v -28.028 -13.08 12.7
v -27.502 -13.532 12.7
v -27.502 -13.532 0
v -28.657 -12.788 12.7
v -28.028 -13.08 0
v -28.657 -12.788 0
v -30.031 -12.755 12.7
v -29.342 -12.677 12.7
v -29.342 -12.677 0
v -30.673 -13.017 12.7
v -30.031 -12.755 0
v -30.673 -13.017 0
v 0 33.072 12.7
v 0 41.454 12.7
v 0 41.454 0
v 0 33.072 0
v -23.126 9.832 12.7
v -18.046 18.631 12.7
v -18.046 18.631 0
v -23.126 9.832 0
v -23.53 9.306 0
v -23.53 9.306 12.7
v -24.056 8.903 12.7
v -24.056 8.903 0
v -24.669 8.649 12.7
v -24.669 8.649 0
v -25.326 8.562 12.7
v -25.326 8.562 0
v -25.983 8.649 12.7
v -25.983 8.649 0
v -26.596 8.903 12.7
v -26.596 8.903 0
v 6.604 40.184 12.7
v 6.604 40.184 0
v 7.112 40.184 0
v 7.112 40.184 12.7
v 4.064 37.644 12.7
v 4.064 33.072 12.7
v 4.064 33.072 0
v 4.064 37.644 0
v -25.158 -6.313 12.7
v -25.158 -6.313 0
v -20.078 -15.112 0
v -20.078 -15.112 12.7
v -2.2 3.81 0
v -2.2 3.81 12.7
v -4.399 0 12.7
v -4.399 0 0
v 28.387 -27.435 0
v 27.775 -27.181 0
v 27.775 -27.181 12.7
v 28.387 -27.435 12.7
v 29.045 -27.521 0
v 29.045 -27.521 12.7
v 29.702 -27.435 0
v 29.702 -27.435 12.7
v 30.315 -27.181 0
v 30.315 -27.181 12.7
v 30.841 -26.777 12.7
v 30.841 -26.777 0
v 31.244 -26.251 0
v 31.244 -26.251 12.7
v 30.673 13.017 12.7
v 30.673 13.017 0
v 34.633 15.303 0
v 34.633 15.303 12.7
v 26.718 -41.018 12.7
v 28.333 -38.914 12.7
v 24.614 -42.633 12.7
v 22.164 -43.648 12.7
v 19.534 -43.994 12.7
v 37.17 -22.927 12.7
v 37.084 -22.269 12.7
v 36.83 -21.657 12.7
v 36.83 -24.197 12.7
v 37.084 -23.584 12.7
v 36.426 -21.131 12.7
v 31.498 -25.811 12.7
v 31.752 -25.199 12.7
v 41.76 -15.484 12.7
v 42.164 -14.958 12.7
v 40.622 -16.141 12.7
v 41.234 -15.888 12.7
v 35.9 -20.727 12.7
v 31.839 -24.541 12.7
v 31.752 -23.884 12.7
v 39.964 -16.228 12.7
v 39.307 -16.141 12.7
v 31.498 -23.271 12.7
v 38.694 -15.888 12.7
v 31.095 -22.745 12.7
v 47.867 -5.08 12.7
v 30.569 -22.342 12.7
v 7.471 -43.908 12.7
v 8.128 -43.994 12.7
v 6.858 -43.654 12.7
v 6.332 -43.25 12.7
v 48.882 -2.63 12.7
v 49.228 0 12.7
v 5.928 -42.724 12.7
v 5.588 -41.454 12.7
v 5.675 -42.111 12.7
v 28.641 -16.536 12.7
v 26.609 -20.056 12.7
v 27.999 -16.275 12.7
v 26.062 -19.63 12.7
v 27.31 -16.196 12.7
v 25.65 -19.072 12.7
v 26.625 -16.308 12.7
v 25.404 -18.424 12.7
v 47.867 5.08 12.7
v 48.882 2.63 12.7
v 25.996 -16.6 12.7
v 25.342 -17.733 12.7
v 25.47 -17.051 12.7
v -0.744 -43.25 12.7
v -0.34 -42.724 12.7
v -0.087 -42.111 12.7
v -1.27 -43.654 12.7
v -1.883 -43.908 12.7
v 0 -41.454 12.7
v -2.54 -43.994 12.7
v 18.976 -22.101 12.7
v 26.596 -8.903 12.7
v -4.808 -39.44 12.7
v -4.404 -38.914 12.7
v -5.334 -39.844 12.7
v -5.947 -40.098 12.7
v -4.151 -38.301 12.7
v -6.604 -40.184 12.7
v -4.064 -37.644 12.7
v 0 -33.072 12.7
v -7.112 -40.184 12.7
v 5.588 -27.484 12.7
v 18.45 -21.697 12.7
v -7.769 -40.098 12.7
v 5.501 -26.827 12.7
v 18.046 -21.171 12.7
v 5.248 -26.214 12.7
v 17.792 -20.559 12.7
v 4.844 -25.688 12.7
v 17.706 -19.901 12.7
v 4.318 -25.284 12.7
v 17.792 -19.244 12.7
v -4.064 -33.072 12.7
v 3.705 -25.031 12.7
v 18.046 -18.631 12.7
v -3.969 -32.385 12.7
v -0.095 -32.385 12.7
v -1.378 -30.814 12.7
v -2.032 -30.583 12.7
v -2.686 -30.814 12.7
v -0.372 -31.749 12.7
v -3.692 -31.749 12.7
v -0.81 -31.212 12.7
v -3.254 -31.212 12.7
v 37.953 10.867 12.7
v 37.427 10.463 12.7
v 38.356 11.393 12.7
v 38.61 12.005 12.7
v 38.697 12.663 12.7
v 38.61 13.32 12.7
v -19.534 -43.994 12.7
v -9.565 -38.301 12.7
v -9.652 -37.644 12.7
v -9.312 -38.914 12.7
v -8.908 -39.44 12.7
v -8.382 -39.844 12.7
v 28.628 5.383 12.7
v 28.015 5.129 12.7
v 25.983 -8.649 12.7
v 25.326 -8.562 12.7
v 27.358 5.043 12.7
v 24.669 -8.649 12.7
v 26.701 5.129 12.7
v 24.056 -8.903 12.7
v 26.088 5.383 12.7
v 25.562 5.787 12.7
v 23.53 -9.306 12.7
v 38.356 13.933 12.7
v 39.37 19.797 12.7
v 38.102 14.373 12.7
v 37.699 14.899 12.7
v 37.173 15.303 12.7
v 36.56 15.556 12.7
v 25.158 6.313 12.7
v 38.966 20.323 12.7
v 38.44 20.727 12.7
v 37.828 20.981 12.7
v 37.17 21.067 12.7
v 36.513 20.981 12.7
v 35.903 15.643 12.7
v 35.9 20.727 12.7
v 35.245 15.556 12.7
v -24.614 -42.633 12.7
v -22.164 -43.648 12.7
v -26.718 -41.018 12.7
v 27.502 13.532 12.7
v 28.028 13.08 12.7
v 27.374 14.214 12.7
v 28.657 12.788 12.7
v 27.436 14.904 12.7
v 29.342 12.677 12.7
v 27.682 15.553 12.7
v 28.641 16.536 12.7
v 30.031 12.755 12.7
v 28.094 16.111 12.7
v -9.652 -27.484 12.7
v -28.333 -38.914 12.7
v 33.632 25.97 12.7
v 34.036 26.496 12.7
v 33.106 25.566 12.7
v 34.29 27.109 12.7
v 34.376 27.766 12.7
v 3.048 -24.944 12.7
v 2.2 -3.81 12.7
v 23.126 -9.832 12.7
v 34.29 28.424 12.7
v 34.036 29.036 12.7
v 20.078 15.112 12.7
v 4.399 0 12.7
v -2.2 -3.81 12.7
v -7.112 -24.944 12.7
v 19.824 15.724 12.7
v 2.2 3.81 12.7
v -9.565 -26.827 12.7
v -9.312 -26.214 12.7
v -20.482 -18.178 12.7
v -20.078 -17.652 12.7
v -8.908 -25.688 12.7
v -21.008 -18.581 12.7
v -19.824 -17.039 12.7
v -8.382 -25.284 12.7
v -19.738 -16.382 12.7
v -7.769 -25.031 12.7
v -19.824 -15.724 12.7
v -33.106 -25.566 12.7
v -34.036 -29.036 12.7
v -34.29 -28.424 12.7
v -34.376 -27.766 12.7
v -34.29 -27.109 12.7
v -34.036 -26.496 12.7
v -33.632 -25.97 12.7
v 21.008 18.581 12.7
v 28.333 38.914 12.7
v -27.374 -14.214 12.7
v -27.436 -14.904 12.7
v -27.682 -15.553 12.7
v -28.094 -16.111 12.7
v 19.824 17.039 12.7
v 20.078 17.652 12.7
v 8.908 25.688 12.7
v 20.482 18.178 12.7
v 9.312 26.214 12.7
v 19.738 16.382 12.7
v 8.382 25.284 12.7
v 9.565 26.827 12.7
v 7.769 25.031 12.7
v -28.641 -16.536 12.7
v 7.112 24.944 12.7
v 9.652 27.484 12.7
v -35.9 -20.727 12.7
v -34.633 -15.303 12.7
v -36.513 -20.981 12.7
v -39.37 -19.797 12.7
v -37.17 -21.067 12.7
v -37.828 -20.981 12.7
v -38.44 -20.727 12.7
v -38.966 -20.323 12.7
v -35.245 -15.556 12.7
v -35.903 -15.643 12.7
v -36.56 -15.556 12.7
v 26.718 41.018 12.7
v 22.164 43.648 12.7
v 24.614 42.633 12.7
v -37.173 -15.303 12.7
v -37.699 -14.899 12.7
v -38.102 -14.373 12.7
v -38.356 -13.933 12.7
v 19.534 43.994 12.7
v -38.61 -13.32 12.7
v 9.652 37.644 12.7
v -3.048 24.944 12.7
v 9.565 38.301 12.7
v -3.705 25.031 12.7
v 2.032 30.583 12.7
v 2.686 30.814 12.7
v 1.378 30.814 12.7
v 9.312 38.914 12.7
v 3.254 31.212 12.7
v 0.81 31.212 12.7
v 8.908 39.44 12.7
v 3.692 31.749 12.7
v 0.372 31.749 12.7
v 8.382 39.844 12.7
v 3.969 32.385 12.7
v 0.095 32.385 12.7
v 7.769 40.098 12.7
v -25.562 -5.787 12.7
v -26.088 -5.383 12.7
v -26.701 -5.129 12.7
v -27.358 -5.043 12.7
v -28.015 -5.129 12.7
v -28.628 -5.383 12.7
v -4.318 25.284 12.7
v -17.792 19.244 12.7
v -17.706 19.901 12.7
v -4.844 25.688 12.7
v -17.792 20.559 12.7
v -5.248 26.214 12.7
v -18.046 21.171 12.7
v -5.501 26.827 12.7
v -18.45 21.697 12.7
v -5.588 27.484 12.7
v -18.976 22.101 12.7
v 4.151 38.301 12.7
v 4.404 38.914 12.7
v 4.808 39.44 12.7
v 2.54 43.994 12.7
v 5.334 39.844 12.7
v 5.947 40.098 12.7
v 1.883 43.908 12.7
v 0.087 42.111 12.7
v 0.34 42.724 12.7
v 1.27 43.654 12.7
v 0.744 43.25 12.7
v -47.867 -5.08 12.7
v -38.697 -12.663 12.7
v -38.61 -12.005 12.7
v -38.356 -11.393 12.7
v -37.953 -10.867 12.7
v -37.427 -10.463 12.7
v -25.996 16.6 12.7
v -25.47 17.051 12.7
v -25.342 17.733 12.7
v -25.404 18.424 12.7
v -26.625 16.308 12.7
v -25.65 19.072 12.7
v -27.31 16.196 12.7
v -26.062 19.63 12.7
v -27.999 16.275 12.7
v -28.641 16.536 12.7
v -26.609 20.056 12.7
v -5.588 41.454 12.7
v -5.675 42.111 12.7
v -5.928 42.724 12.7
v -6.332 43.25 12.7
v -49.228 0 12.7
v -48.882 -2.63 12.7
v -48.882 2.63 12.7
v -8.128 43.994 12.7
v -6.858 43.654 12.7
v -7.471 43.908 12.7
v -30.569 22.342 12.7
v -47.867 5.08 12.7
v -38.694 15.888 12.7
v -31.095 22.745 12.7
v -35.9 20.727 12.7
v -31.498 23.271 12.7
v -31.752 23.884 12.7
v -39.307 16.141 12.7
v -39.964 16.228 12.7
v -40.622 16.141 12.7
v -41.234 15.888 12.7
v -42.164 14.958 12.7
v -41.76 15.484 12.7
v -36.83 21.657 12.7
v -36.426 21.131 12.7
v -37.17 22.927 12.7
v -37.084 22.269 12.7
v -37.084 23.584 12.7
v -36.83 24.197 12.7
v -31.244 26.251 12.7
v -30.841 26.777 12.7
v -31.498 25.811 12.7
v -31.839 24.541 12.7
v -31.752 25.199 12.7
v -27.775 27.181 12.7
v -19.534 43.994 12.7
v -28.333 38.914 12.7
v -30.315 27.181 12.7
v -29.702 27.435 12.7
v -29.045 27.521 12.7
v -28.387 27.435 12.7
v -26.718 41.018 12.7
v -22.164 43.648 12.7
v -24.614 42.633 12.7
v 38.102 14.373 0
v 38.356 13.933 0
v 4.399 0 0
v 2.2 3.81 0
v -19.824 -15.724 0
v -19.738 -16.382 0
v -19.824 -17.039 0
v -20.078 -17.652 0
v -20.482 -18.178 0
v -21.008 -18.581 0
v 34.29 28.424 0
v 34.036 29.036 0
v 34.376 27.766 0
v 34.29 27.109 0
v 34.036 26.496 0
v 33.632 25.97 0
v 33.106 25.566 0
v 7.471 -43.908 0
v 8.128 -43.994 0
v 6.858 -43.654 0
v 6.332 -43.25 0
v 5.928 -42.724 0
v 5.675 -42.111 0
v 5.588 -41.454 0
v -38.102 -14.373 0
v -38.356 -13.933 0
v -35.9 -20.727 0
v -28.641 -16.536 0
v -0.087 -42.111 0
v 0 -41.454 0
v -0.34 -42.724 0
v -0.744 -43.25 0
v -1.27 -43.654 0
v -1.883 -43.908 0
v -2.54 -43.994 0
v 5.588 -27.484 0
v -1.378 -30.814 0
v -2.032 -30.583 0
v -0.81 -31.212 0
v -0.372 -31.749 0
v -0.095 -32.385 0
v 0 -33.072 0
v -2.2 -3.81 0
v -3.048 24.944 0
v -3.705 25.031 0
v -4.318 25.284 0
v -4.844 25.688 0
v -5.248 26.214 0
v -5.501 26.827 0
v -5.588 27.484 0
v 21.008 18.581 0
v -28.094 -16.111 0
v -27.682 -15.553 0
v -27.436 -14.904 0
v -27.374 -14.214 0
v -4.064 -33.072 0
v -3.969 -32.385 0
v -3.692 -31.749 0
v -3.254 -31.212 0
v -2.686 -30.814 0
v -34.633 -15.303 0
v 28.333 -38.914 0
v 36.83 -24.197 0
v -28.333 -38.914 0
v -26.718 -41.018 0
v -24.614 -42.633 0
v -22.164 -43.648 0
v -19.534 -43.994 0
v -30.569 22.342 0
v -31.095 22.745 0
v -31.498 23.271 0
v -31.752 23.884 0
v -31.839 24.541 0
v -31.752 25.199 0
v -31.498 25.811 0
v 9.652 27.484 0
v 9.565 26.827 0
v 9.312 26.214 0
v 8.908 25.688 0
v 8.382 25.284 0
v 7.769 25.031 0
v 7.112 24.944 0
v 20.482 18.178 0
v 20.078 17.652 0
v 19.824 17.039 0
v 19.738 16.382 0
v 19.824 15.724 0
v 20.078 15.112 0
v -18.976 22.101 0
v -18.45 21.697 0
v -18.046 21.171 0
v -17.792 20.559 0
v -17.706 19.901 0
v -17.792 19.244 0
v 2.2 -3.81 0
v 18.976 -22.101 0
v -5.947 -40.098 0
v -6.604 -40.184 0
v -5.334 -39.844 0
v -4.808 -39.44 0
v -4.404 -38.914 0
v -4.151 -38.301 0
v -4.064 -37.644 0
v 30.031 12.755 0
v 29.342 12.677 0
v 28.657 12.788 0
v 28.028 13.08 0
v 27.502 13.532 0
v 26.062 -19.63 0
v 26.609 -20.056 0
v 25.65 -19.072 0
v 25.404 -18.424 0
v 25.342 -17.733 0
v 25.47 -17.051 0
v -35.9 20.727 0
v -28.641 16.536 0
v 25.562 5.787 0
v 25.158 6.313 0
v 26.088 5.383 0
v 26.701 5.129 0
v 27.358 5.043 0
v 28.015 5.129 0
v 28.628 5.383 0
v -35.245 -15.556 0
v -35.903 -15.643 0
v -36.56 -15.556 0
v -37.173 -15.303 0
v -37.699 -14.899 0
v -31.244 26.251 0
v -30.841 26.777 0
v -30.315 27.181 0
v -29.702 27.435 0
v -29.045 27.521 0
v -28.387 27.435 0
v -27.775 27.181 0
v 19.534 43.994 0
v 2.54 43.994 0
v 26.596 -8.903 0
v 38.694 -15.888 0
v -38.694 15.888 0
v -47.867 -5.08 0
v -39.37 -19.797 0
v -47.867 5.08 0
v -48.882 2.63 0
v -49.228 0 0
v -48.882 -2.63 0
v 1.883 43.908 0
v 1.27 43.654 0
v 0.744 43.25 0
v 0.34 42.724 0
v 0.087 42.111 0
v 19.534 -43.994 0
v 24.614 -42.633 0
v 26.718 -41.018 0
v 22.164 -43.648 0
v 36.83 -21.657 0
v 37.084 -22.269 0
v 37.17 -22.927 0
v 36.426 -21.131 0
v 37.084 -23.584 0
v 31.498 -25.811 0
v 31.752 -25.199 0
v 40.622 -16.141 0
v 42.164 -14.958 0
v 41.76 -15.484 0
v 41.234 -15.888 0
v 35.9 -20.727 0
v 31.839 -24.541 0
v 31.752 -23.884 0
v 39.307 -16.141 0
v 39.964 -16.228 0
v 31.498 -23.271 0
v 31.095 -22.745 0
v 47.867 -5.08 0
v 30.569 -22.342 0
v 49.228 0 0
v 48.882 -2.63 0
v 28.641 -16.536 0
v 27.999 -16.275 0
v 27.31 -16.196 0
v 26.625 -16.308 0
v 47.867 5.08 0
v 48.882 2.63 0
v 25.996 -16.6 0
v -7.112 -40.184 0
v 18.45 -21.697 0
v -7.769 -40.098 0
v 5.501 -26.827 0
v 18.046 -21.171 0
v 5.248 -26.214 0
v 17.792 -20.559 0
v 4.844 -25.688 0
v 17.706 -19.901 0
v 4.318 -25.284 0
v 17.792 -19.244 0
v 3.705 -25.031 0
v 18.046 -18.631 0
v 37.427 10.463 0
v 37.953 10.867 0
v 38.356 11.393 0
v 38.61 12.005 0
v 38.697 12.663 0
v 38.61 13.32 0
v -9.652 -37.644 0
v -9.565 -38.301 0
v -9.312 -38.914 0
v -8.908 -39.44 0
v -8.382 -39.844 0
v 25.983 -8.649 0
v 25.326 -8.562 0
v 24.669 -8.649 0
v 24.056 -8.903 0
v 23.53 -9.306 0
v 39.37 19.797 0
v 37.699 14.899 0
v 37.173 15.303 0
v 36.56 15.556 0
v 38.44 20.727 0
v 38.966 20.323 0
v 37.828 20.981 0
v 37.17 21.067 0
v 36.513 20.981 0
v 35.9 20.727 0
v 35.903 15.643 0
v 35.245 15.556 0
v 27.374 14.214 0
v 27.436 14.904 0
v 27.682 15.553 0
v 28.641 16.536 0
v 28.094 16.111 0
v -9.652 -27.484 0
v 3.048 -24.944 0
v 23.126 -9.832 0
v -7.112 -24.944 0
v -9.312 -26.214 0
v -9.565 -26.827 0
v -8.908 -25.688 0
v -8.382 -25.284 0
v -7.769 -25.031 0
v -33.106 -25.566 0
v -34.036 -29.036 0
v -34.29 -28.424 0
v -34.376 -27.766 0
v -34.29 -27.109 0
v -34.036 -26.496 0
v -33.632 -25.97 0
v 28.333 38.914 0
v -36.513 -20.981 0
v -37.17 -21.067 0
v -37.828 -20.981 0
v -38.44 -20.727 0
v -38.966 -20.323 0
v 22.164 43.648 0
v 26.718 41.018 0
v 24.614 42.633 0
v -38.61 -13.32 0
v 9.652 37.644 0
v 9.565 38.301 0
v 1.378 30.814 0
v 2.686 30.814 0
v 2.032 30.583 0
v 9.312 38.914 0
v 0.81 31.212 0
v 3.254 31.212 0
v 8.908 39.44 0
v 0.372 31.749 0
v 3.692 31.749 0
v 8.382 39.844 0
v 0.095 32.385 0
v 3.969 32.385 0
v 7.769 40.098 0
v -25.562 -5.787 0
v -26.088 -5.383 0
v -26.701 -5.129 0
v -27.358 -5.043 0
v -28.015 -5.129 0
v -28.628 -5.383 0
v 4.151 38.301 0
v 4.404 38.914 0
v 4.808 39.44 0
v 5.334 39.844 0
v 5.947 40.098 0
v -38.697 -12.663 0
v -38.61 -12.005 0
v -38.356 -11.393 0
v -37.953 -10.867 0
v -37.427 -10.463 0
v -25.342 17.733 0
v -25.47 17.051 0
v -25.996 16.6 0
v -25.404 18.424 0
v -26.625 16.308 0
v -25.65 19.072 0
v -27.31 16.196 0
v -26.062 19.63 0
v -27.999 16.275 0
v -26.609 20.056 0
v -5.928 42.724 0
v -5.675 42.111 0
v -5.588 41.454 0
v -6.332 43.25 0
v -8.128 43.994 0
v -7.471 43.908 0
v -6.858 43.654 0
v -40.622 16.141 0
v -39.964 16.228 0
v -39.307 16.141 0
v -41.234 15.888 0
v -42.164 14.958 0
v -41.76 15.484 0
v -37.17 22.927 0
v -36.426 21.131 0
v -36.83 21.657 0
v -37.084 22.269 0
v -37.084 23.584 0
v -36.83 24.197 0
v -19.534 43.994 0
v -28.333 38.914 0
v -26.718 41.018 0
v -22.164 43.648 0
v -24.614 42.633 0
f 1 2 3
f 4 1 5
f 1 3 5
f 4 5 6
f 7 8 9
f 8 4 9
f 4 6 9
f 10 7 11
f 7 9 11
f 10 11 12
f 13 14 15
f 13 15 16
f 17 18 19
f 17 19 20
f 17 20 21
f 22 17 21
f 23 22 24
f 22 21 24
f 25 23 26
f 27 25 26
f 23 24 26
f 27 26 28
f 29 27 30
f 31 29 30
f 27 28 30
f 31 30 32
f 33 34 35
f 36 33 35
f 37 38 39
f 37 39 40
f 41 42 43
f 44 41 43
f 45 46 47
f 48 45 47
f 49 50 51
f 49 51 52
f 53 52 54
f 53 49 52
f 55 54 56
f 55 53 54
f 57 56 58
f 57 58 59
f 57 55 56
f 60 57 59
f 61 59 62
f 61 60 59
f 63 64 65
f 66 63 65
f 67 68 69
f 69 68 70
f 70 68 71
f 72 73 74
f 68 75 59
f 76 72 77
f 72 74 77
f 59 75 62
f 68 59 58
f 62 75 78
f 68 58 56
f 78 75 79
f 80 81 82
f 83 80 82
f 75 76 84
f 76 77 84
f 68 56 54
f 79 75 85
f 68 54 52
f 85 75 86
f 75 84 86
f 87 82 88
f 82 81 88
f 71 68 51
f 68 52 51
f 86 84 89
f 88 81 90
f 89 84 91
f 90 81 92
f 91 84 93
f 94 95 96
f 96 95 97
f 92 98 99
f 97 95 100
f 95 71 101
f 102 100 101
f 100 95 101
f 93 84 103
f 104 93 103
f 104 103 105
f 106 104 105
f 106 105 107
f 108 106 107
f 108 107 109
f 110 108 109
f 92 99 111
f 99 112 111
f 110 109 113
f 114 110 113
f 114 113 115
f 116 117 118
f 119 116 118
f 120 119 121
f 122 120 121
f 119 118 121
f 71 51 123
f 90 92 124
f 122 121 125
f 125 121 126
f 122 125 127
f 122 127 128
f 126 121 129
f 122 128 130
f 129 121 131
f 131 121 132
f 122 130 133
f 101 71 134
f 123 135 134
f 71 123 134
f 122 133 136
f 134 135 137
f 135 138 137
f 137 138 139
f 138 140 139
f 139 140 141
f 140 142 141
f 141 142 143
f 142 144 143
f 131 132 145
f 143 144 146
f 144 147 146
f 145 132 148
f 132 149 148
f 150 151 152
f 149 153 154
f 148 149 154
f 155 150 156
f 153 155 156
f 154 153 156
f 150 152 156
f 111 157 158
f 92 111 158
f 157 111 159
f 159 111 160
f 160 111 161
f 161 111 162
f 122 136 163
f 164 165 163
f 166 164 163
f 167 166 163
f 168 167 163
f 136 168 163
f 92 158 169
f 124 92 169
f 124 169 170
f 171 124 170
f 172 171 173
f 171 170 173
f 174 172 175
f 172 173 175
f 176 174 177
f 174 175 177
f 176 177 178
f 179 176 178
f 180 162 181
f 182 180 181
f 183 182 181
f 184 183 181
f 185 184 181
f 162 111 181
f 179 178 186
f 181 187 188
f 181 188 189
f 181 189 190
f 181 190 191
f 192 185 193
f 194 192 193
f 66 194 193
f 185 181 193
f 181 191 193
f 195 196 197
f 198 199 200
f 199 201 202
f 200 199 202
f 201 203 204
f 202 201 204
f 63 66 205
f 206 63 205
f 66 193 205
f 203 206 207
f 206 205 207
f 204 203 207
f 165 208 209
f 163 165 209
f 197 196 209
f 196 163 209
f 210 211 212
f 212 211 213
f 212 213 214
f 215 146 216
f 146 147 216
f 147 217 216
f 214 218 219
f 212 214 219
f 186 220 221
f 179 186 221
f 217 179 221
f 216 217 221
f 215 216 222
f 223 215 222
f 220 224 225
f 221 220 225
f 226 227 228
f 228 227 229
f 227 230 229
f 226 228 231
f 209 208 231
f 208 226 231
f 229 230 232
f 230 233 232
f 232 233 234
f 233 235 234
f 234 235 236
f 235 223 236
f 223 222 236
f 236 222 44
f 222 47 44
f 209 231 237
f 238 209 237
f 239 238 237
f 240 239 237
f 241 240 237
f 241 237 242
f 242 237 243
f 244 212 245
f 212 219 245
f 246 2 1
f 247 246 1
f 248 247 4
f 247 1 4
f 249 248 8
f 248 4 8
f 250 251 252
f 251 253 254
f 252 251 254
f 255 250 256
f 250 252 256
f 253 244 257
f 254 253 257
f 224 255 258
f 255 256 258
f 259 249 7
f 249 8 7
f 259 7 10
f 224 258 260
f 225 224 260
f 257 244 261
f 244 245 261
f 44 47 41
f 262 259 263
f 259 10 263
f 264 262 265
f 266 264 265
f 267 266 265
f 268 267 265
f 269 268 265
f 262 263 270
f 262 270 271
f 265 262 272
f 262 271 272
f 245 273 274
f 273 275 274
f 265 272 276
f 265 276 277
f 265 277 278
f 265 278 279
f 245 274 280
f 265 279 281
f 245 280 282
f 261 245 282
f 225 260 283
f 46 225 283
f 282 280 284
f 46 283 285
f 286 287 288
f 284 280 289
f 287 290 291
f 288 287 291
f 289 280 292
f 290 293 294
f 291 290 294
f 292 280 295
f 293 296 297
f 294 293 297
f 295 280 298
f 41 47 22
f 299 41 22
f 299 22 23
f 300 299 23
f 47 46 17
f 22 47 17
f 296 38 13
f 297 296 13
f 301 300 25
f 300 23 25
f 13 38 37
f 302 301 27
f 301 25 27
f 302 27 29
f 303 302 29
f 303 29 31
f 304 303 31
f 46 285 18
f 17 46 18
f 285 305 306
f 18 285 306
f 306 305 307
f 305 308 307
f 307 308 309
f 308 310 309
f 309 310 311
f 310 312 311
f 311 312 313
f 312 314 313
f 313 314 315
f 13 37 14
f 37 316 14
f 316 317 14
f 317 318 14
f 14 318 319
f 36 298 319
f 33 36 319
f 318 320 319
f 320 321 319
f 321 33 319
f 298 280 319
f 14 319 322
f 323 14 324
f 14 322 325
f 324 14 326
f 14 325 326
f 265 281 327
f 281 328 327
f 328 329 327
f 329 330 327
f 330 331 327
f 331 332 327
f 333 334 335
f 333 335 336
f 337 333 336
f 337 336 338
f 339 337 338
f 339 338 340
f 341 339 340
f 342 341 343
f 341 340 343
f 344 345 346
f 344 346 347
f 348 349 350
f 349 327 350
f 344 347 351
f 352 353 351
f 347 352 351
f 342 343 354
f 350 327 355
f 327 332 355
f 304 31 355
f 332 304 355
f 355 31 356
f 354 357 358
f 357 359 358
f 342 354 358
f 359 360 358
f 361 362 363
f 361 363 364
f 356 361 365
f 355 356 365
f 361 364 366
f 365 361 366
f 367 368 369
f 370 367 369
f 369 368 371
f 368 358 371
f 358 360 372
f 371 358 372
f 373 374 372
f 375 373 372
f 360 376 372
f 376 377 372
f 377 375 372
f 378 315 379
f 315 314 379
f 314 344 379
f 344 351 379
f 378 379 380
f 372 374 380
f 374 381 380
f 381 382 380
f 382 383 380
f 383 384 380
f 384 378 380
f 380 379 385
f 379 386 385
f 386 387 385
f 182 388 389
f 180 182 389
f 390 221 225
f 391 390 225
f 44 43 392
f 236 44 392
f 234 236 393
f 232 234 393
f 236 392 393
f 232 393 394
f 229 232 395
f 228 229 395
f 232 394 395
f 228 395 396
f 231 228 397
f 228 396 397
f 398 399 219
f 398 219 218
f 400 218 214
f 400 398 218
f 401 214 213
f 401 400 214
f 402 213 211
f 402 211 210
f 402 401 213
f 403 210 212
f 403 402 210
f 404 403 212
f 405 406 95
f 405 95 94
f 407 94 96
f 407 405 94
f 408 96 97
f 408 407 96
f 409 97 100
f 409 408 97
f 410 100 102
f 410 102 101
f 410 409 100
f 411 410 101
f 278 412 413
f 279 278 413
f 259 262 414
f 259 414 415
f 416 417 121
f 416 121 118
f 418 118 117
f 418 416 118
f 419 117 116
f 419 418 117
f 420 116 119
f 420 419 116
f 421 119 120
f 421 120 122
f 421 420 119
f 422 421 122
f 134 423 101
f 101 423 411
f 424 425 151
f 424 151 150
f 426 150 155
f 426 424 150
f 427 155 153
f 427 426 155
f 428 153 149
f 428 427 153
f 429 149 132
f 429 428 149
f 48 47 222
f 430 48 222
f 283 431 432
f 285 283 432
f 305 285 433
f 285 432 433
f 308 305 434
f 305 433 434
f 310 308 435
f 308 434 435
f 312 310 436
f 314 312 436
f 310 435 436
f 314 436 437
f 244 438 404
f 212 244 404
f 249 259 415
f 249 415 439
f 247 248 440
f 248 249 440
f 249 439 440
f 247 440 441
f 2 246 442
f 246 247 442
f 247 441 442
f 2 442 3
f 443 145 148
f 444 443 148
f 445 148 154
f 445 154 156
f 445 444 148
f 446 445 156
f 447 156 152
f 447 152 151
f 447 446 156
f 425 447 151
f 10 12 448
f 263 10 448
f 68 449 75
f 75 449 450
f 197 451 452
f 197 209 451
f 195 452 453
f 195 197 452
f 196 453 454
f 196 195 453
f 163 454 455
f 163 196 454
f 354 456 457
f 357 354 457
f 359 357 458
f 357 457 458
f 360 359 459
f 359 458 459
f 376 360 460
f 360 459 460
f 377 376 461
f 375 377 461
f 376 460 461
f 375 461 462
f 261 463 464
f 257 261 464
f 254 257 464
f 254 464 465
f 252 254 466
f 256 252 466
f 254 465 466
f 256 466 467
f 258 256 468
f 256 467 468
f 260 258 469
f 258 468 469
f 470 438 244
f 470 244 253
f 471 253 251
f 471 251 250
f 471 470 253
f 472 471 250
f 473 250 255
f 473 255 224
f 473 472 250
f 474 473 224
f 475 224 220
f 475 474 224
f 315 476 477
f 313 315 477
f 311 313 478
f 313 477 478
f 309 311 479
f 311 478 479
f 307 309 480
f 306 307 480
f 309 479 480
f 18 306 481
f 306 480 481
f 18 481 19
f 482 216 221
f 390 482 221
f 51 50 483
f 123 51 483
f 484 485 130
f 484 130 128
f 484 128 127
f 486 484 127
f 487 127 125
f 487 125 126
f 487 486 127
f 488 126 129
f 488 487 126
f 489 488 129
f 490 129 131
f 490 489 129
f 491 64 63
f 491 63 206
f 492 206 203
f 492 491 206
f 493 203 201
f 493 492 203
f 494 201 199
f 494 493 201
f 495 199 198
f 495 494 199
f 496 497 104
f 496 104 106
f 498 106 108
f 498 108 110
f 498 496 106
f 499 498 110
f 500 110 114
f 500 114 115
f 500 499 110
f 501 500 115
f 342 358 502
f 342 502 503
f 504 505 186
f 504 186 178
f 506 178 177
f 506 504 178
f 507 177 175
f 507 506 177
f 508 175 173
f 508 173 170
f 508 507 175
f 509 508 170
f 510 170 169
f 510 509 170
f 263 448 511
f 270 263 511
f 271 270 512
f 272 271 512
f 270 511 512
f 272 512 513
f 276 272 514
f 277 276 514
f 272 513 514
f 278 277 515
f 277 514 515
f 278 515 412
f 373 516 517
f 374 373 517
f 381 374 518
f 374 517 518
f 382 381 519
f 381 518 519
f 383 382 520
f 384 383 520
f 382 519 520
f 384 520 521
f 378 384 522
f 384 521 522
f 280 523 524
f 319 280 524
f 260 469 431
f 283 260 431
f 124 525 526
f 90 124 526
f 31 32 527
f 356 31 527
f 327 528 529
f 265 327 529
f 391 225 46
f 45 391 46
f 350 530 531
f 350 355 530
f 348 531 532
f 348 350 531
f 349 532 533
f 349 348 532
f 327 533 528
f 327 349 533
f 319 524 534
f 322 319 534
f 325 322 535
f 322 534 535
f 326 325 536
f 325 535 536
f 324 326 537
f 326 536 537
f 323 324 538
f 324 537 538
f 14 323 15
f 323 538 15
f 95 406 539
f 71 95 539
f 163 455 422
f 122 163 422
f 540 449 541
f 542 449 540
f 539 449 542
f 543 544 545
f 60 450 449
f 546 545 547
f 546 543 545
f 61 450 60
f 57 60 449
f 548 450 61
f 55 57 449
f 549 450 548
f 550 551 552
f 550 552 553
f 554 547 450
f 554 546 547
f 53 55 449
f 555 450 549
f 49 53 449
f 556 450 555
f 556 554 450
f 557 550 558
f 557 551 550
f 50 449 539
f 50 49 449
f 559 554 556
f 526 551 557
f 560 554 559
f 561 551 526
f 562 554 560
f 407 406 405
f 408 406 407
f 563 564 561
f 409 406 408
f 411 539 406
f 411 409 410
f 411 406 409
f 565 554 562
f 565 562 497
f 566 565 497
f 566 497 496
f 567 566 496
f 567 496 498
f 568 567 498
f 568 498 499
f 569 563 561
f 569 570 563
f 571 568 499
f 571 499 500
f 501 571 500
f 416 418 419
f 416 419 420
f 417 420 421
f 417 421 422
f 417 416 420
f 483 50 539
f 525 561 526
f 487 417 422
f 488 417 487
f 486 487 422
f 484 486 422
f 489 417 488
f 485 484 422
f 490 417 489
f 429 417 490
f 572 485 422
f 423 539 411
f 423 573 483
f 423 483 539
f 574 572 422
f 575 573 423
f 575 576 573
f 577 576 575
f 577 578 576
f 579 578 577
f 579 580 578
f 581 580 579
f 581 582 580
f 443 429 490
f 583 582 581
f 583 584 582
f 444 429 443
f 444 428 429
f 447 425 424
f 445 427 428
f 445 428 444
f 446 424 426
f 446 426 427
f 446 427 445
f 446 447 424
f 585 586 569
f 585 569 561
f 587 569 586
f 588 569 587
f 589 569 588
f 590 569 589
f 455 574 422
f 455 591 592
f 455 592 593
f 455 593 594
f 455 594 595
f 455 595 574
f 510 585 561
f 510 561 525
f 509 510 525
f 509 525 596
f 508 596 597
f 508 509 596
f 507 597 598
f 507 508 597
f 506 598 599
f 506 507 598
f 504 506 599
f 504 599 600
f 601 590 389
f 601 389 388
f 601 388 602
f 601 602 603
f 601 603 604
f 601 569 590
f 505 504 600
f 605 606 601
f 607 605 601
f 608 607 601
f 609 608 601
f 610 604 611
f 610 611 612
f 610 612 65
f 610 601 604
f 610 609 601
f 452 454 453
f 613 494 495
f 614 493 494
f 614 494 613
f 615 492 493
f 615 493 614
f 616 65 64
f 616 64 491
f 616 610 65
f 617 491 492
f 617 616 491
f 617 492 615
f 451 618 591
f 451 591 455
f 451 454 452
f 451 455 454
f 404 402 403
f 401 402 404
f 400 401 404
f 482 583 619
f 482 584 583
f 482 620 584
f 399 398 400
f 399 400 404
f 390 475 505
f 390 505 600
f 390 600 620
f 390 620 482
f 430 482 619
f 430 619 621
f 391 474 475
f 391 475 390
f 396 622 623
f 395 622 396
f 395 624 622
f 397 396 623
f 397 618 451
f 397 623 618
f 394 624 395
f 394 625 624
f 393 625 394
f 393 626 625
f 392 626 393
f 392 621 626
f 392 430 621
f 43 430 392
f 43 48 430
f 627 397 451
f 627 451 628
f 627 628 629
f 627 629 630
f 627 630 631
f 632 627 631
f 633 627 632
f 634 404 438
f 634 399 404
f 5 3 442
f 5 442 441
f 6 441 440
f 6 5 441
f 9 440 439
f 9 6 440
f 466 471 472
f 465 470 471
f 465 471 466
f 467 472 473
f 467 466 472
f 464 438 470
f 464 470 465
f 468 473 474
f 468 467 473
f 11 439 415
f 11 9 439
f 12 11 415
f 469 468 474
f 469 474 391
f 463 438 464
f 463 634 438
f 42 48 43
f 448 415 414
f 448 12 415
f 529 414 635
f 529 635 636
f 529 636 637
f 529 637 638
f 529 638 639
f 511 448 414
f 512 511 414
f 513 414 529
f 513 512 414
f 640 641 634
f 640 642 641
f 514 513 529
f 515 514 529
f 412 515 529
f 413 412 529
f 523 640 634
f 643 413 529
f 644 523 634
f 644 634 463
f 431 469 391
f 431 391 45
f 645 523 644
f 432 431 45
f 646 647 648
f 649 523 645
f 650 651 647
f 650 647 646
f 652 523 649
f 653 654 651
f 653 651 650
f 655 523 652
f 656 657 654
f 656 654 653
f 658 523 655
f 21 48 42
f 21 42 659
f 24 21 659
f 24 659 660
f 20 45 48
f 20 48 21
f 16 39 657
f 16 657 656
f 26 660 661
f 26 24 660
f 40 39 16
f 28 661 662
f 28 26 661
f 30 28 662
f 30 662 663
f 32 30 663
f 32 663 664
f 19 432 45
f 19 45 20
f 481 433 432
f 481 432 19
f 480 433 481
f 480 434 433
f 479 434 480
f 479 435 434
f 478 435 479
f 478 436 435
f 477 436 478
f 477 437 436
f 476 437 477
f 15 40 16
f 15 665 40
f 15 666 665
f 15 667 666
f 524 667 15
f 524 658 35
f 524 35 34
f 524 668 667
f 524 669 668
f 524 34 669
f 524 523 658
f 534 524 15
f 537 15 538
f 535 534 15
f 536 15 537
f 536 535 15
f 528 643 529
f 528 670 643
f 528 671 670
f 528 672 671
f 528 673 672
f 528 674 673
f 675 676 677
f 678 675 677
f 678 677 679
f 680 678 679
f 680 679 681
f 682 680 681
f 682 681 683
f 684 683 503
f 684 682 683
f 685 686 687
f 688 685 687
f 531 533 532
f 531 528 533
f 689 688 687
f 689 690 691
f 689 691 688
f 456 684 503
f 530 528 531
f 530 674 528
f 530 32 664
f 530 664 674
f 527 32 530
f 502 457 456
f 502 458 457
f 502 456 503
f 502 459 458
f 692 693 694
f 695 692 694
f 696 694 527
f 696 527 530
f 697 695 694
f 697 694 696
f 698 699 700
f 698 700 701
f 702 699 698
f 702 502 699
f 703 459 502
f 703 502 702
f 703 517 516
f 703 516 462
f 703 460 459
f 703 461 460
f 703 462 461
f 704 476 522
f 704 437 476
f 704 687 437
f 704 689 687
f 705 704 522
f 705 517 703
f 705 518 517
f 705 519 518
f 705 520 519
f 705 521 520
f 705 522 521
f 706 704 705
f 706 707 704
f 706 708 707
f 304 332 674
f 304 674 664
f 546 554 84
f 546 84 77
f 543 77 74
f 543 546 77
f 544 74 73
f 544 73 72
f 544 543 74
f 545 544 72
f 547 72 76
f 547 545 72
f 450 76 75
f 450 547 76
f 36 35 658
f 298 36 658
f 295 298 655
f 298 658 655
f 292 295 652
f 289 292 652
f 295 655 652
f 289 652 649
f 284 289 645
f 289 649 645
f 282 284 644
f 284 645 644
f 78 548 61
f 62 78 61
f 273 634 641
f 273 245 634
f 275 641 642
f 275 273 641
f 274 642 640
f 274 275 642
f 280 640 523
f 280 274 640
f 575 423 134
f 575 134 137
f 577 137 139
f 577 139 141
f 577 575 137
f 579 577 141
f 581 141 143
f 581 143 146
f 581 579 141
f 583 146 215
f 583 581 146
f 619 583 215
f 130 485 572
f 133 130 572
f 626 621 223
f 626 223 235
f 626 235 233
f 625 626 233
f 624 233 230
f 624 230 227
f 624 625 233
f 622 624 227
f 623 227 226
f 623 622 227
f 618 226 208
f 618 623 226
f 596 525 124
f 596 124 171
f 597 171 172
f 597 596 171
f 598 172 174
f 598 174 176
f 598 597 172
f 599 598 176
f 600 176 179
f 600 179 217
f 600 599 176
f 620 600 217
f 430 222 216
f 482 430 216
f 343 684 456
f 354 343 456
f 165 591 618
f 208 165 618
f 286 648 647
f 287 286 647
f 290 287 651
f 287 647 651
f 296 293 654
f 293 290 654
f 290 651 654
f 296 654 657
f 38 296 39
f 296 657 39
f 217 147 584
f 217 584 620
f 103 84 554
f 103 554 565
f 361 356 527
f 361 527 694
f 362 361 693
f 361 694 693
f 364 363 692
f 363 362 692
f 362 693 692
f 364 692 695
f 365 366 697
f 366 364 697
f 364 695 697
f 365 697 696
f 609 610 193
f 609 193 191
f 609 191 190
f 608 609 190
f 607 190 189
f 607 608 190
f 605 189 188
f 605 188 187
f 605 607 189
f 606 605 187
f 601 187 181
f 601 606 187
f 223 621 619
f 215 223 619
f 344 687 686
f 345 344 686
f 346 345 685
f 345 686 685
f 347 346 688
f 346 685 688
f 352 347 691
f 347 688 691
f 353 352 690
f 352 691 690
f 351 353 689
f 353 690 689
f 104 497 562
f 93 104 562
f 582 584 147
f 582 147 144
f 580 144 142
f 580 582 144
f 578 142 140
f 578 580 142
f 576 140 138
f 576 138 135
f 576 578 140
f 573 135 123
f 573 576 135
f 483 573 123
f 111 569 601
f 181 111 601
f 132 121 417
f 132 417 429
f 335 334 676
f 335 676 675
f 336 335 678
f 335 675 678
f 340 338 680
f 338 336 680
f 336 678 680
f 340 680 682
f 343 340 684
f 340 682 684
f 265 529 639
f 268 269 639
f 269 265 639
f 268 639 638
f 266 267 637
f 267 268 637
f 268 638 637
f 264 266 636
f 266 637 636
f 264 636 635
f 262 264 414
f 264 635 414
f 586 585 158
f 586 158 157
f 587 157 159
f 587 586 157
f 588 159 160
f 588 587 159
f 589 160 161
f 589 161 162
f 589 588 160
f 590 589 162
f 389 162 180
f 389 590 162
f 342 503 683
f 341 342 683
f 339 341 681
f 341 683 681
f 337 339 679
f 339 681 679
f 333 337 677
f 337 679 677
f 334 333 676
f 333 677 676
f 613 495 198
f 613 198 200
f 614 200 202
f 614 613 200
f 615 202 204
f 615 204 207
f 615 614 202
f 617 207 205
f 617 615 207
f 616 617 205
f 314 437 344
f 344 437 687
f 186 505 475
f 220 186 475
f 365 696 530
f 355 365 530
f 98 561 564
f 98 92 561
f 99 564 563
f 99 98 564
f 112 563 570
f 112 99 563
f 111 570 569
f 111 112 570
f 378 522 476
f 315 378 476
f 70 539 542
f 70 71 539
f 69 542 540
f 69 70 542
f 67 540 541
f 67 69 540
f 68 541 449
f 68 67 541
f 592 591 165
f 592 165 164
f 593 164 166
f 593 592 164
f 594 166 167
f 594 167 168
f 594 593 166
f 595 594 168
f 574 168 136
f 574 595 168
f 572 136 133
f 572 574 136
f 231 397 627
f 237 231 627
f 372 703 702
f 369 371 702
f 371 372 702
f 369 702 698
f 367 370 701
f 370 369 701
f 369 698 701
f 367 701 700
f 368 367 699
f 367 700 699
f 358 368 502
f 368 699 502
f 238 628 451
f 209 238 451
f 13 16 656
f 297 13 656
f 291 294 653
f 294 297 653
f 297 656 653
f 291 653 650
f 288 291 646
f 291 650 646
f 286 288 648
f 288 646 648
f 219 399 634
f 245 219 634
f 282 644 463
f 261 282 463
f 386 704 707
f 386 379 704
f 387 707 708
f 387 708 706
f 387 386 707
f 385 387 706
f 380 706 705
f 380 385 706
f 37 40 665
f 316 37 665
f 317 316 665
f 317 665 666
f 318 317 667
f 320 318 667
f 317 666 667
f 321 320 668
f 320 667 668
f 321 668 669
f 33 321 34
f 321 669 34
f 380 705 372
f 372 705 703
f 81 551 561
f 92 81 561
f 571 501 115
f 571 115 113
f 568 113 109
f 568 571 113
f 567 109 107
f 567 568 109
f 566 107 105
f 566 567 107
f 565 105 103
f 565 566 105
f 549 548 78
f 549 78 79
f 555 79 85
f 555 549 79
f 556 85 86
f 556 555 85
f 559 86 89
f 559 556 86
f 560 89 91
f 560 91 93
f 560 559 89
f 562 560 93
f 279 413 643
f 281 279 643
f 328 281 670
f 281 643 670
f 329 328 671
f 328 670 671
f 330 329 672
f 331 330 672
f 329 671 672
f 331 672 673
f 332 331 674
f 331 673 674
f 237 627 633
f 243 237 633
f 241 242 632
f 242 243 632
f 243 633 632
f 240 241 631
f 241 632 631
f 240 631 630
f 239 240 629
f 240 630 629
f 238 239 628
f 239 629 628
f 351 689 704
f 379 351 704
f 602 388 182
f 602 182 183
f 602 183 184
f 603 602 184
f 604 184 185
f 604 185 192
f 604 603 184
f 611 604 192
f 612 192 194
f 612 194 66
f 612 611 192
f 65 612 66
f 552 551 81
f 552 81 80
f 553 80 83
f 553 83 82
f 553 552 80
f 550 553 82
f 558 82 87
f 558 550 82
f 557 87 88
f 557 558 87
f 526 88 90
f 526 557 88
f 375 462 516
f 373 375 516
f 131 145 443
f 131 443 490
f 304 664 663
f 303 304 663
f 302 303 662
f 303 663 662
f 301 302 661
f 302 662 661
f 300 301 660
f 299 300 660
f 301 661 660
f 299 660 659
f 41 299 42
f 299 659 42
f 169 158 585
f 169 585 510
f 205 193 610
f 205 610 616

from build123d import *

# Parameters (mm, degrees)
F1_DEPTH    = 12.7
F2_R        = 10.16
F3_T1_DEPTH = 12.7
F3_T3_DEPTH = 25.4
F5_DEPTH    = 12.701


# Not quite as in the source:
# - a fillet or chamfer that OpenCascade refuses, or shapes differently, is made with other operations: its cross-section is extruded or revolved along the edge and cut away or added


with BuildPart() as f1:
    # F0 (on Top) → F1 (new body)
    with BuildSketch(Plane.XY):
        Polygon((-5.588, 24.9440905122), (-5.588, 43.9940905122), (-25.4, 43.9940905122), (-38.1, 21.9970452561), (-26.4415660143, 15.2660452561), (-24.4095660143, 18.7855724971), (-32.7684432116, 23.6115724971), (-29.9744432116, 28.4509224535), (-16.7762160579, 20.8309224535), (-24.3962160579, 7.6326952998), (-40.894, 17.1576952998), (-50.8, 0), (-38.1, -21.9970452561), (-26.4415660143, -15.2660452561), (-28.4735660143, -11.7465180151), (-36.8324432116, -16.5725180151), (-39.6264432116, -11.7331680588), (-26.4282160579, -4.1131680588), (-18.8082160579, -17.3113952125), (-35.306, -26.8363952125), (-25.4, -43.9940905122), (0, -43.9940905122), (0, -30.5320905122), (-4.064, -30.5320905122), (-4.064, -40.1840905122), (-9.652, -40.1840905122), (-9.652, -24.9440905122), (5.588, -24.9440905122), (5.588, -43.9940905122), (25.4, -43.9940905122), (38.1, -21.9970452561), (26.4415660143, -15.2660452561), (24.4095660143, -18.7855724971), (32.7684432116, -23.6115724971), (29.9744432116, -28.4509224535), (16.7762160579, -20.8309224535), (24.3962160579, -7.6326952998), (40.894, -17.1576952998), (50.8, 0), (38.1, 21.9970452561), (26.4415660143, 15.2660452561), (28.4735660143, 11.7465180151), (36.8324432116, 16.5725180151), (39.6264432116, 11.7331680588), (26.4282160579, 4.1131680588), (18.8082160579, 17.3113952125), (35.306, 26.8363952125), (25.4, 43.9940905122), (0, 43.9940905122), (0, 30.5320905122), (4.064, 30.5320905122), (4.064, 40.1840905122), (9.652, 40.1840905122), (9.652, 24.9440905122), align=None)
    extrude(amount=F1_DEPTH)

    # F2
    f2_edges = [f1.edges().sort_by_distance(p)[0] for p in [
        (-50.8, 0, 6.35),
        (-25.4, -43.994091, 6.35),
        (25.4, -43.994091, 6.35),
        (50.8, 0, 6.35),
        (25.4, 43.994091, 6.35),
        (-25.4, 43.994091, 6.35),
    ]]
    fillet(f2_edges, radius=F2_R)

    # F3: fillet of radius 2.54 on 48 edges, made by hand

    # F3_s2 → F3_t1 (join)
    with BuildSketch(Plane.XY):
        with BuildLine():
            ThreePointArc((21.0079205835, 18.5813952125), (19.8244689847, 17.0390910614), (20.0782160579, 15.1116906869))
            Line((20.0782160579, 15.1116906869), (18.8082160579, 17.3113952125))
            Line((18.8082160579, 17.3113952125), (21.0079205835, 18.5813952125))
        make_face()
        with BuildLine():
            ThreePointArc((25.1582160579, 6.3128725844), (26.700520209, 5.1294209856), (28.6279205835, 5.3831680588))
            Line((28.6279205835, 5.3831680588), (26.4282160579, 4.1131680588))
            Line((26.4282160579, 4.1131680588), (25.1582160579, 6.3128725844))
        make_face()
        with BuildLine():
            ThreePointArc((37.426738686, 10.4631680588), (38.6101902847, 12.0054722098), (38.3564432116, 13.9328725844))
            Line((38.3564432116, 13.9328725844), (39.6264432116, 11.7331680588))
            Line((39.6264432116, 11.7331680588), (37.426738686, 10.4631680588))
        make_face()
        with BuildLine():
            ThreePointArc((38.1024432116, 14.3728134895), (36.5601390605, 15.5562650883), (34.632738686, 15.3025180151))
            Line((34.632738686, 15.3025180151), (36.8324432116, 16.5725180151))
            Line((36.8324432116, 16.5725180151), (38.1024432116, 14.3728134895))
        make_face()
        with BuildLine():
            ThreePointArc((26.5959205835, -8.9026952998), (24.668520209, -8.6489482266), (23.1262160579, -9.8323998254))
            Line((23.1262160579, -9.8323998254), (24.3962160579, -7.6326952998))
            Line((24.3962160579, -7.6326952998), (26.5959205835, -8.9026952998))
        make_face()
        with BuildLine():
            ThreePointArc((18.0462160579, -18.6312179278), (17.7924689847, -20.5586183024), (18.9759205835, -22.1009224535))
            Line((18.9759205835, -22.1009224535), (16.7762160579, -20.8309224535))
            Line((16.7762160579, -20.8309224535), (18.0462160579, -18.6312179278))
        make_face()
        with BuildLine():
            ThreePointArc((27.774738686, -27.1809224535), (29.7021390605, -27.4346695266), (31.2444432116, -26.2512179278))
            Line((31.2444432116, -26.2512179278), (29.9744432116, -28.4509224535))
            Line((29.9744432116, -28.4509224535), (27.774738686, -27.1809224535))
        make_face()
        with BuildLine():
            ThreePointArc((31.4984432116, -25.8112770227), (31.7521902847, -23.8838766482), (30.568738686, -22.3415724971))
            Line((30.568738686, -22.3415724971), (32.7684432116, -23.6115724971))
            Line((32.7684432116, -23.6115724971), (31.4984432116, -25.8112770227))
        make_face()
        with BuildLine():
            ThreePointArc((5.588, -27.4840905122), (4.8440512242, -25.688039288), (3.048, -24.9440905122))
            Line((3.048, -24.9440905122), (5.588, -24.9440905122))
            Line((5.588, -24.9440905122), (5.588, -27.4840905122))
        make_face()
        with BuildLine():
            ThreePointArc((-7.112, -24.9440905122), (-8.9080512242, -25.688039288), (-9.652, -27.4840905122))
            Line((-9.652, -27.4840905122), (-9.652, -24.9440905122))
            Line((-9.652, -24.9440905122), (-7.112, -24.9440905122))
        make_face()
        with BuildLine():
            ThreePointArc((-9.652, -37.6440905122), (-8.9080512242, -39.4401417365), (-7.112, -40.1840905122))
            Line((-7.112, -40.1840905122), (-9.652, -40.1840905122))
            Line((-9.652, -40.1840905122), (-9.652, -37.6440905122))
        make_face()
        with BuildLine():
            ThreePointArc((-6.604, -40.1840905122), (-4.8079487758, -39.4401417365), (-4.064, -37.6440905122))
            Line((-4.064, -37.6440905122), (-4.064, -40.1840905122))
            Line((-4.064, -40.1840905122), (-6.604, -40.1840905122))
        make_face()
        with BuildLine():
            ThreePointArc((-20.0782160579, -15.1116906869), (-19.8244689847, -17.0390910614), (-21.0079205835, -18.5813952125))
            Line((-21.0079205835, -18.5813952125), (-18.8082160579, -17.3113952125))
            Line((-18.8082160579, -17.3113952125), (-20.0782160579, -15.1116906869))
        make_face()
        with BuildLine():
            ThreePointArc((-28.6279205835, -5.3831680588), (-26.700520209, -5.1294209856), (-25.1582160579, -6.3128725844))
            Line((-25.1582160579, -6.3128725844), (-26.4282160579, -4.1131680588))
            Line((-26.4282160579, -4.1131680588), (-28.6279205835, -5.3831680588))
        make_face()
        with BuildLine():
            ThreePointArc((-38.3564432116, -13.9328725844), (-38.6101902847, -12.0054722098), (-37.426738686, -10.4631680588))
            Line((-37.426738686, -10.4631680588), (-39.6264432116, -11.7331680588))
            Line((-39.6264432116, -11.7331680588), (-38.3564432116, -13.9328725844))
        make_face()
        with BuildLine():
            ThreePointArc((-34.632738686, -15.3025180151), (-36.5601390605, -15.5562650883), (-38.1024432116, -14.3728134895))
            Line((-38.1024432116, -14.3728134895), (-36.8324432116, -16.5725180151))
            Line((-36.8324432116, -16.5725180151), (-34.632738686, -15.3025180151))
        make_face()
        with BuildLine():
            ThreePointArc((-30.568738686, 22.3415724971), (-31.7521902847, 23.8838766482), (-31.4984432116, 25.8112770227))
            Line((-31.4984432116, 25.8112770227), (-32.7684432116, 23.6115724971))
            Line((-32.7684432116, 23.6115724971), (-30.568738686, 22.3415724971))
        make_face()
        with BuildLine():
            ThreePointArc((-23.1262160579, 9.8323998254), (-24.668520209, 8.6489482266), (-26.5959205835, 8.9026952998))
            Line((-26.5959205835, 8.9026952998), (-24.3962160579, 7.6326952998))
            Line((-24.3962160579, 7.6326952998), (-23.1262160579, 9.8323998254))
        make_face()
        with BuildLine():
            ThreePointArc((-18.9759205835, 22.1009224535), (-17.7924689847, 20.5586183024), (-18.0462160579, 18.6312179278))
            Line((-18.0462160579, 18.6312179278), (-16.7762160579, 20.8309224535))
            Line((-16.7762160579, 20.8309224535), (-18.9759205835, 22.1009224535))
        make_face()
        with BuildLine():
            ThreePointArc((-31.2444432116, 26.2512179278), (-29.7021390605, 27.4346695266), (-27.774738686, 27.1809224535))
            Line((-27.774738686, 27.1809224535), (-29.9744432116, 28.4509224535))
            Line((-29.9744432116, 28.4509224535), (-31.2444432116, 26.2512179278))
        make_face()
        with BuildLine():
            ThreePointArc((-3.048, 24.9440905122), (-4.8440512242, 25.688039288), (-5.588, 27.4840905122))
            Line((-5.588, 27.4840905122), (-5.588, 24.9440905122))
            Line((-5.588, 24.9440905122), (-3.048, 24.9440905122))
        make_face()
        with BuildLine():
            ThreePointArc((4.064, 37.6440905122), (4.8079487758, 39.4401417365), (6.604, 40.1840905122))
            Line((6.604, 40.1840905122), (4.064, 40.1840905122))
            Line((4.064, 40.1840905122), (4.064, 37.6440905122))
        make_face()
        with BuildLine():
            ThreePointArc((9.652, 27.4840905122), (8.9080512242, 25.688039288), (7.112, 24.9440905122))
            Line((7.112, 24.9440905122), (9.652, 24.9440905122))
            Line((9.652, 24.9440905122), (9.652, 27.4840905122))
        make_face()
        with BuildLine():
            ThreePointArc((7.112, 40.1840905122), (8.9080512242, 39.4401417365), (9.652, 37.6440905122))
            Line((9.652, 37.6440905122), (9.652, 40.1840905122))
            Line((9.652, 40.1840905122), (7.112, 40.1840905122))
        make_face()
    extrude(amount=F3_T1_DEPTH)

    # F3_s4 → F3_t3 (cut)
    with BuildSketch(Plane.XY.offset(-6.35)):
        with BuildLine():
            ThreePointArc((34.036, 29.0360997381), (34.2897470732, 27.1086993635), (33.1062954744, 25.5663952125))
            Line((33.1062954744, 25.5663952125), (35.306, 26.8363952125))
            Line((35.306, 26.8363952125), (34.036, 29.0360997381))
        make_face()
        with BuildLine():
            ThreePointArc((30.6732705399, 13.0165180151), (28.7458701653, 12.762770942), (27.2035660143, 13.9462225408))
            Line((27.2035660143, 13.9462225408), (28.4735660143, 11.7465180151))
            Line((28.4735660143, 11.7465180151), (30.6732705399, 13.0165180151))
        make_face()
        with BuildLine():
            ThreePointArc((27.7115660143, 13.0663407305), (27.4578189411, 14.9937411051), (28.6412705399, 16.5360452561))
            Line((28.6412705399, 16.5360452561), (26.4415660143, 15.2660452561))
            Line((26.4415660143, 15.2660452561), (27.7115660143, 13.0663407305))
        make_face()
        with BuildLine():
            ThreePointArc((35.9002954744, 20.7270452561), (37.8276958489, 20.9807923293), (39.37, 19.7973407305))
            Line((39.37, 19.7973407305), (38.1, 21.9970452561))
            Line((38.1, 21.9970452561), (35.9002954744, 20.7270452561))
        make_face()
        with BuildLine():
            ThreePointArc((42.164, -14.9579907742), (40.6216958489, -16.1414423729), (38.6942954744, -15.8876952998))
            Line((38.6942954744, -15.8876952998), (40.894, -17.1576952998))
            Line((40.894, -17.1576952998), (42.164, -14.9579907742))
        make_face()
        with BuildLine():
            ThreePointArc((35.9002954744, -20.7270452561), (37.0837470732, -22.2693494072), (36.83, -24.1967497817))
            Line((36.83, -24.1967497817), (38.1, -21.9970452561))
            Line((38.1, -21.9970452561), (35.9002954744, -20.7270452561))
        make_face()
        with BuildLine():
            ThreePointArc((25.1715660143, -17.4657497817), (26.7138701653, -16.282298183), (28.6412705399, -16.5360452561))
            Line((28.6412705399, -16.5360452561), (26.4415660143, -15.2660452561))
            Line((26.4415660143, -15.2660452561), (25.1715660143, -17.4657497817))
        make_face()
        with BuildLine():
            ThreePointArc((26.6092705399, -20.0555724971), (25.4258189411, -18.5132683461), (25.6795660143, -16.5858679715))
            Line((25.6795660143, -16.5858679715), (24.4095660143, -18.7855724971))
            Line((24.4095660143, -18.7855724971), (26.6092705399, -20.0555724971))
        make_face()
        with BuildLine():
            ThreePointArc((8.128, -43.9940905122), (6.3319487758, -43.2501417365), (5.588, -41.4540905122))
            Line((5.588, -41.4540905122), (5.588, -43.9940905122))
            Line((5.588, -43.9940905122), (8.128, -43.9940905122))
        make_face()
        with BuildLine():
            ThreePointArc((0, -41.4540905122), (-0.7439487758, -43.2501417365), (-2.54, -43.9940905122))
            Line((-2.54, -43.9940905122), (0, -43.9940905122))
            Line((0, -43.9940905122), (0, -41.4540905122))
        make_face()
        with BuildLine():
            ThreePointArc((-4.064, -33.0720905122), (-3.3200512242, -31.276039288), (-1.524, -30.5320905122))
            Line((-1.524, -30.5320905122), (-4.064, -30.5320905122))
            Line((-4.064, -30.5320905122), (-4.064, -33.0720905122))
        make_face()
        with BuildLine():
            ThreePointArc((-2.54, -30.5320905122), (-0.7439487758, -31.276039288), (0, -33.0720905122))
            Line((0, -33.0720905122), (0, -30.5320905122))
            Line((0, -30.5320905122), (-2.54, -30.5320905122))
        make_face()
        with BuildLine():
            ThreePointArc((-33.1062954744, -25.5663952125), (-34.2897470732, -27.1086993635), (-34.036, -29.0360997381))
            Line((-34.036, -29.0360997381), (-35.306, -26.8363952125))
            Line((-35.306, -26.8363952125), (-33.1062954744, -25.5663952125))
        make_face()
        with BuildLine():
            ThreePointArc((-27.2035660143, -13.9462225408), (-28.7458701653, -12.762770942), (-30.6732705399, -13.0165180151))
            Line((-30.6732705399, -13.0165180151), (-28.4735660143, -11.7465180151))
            Line((-28.4735660143, -11.7465180151), (-27.2035660143, -13.9462225408))
        make_face()
        with BuildLine():
            ThreePointArc((-28.6412705399, -16.5360452561), (-27.4578189411, -14.9937411051), (-27.7115660143, -13.0663407305))
            Line((-27.7115660143, -13.0663407305), (-26.4415660143, -15.2660452561))
            Line((-26.4415660143, -15.2660452561), (-28.6412705399, -16.5360452561))
        make_face()
        with BuildLine():
            ThreePointArc((-39.37, -19.7973407305), (-37.8276958489, -20.9807923293), (-35.9002954744, -20.7270452561))
            Line((-35.9002954744, -20.7270452561), (-38.1, -21.9970452561))
            Line((-38.1, -21.9970452561), (-39.37, -19.7973407305))
        make_face()
        with BuildLine():
            ThreePointArc((-38.6942954744, 15.8876952998), (-40.6216958489, 16.1414423729), (-42.164, 14.9579907742))
            Line((-42.164, 14.9579907742), (-40.894, 17.1576952998))
            Line((-40.894, 17.1576952998), (-38.6942954744, 15.8876952998))
        make_face()
        with BuildLine():
            ThreePointArc((-36.83, 24.1967497817), (-37.0837470732, 22.2693494072), (-35.9002954744, 20.7270452561))
            Line((-35.9002954744, 20.7270452561), (-38.1, 21.9970452561))
            Line((-38.1, 21.9970452561), (-36.83, 24.1967497817))
        make_face()
        with BuildLine():
            ThreePointArc((-28.6412705399, 16.5360452561), (-26.7138701653, 16.282298183), (-25.1715660143, 17.4657497817))
            Line((-25.1715660143, 17.4657497817), (-26.4415660143, 15.2660452561))
            Line((-26.4415660143, 15.2660452561), (-28.6412705399, 16.5360452561))
        make_face()
        with BuildLine():
            ThreePointArc((-25.6795660143, 16.5858679715), (-25.4258189411, 18.5132683461), (-26.6092705399, 20.0555724971))
            Line((-26.6092705399, 20.0555724971), (-24.4095660143, 18.7855724971))
            Line((-24.4095660143, 18.7855724971), (-25.6795660143, 16.5858679715))
        make_face()
        with BuildLine():
            ThreePointArc((-5.588, 41.4540905122), (-6.3319487758, 43.2501417365), (-8.128, 43.9940905122))
            Line((-8.128, 43.9940905122), (-5.588, 43.9940905122))
            Line((-5.588, 43.9940905122), (-5.588, 41.4540905122))
        make_face()
        with BuildLine():
            ThreePointArc((2.54, 43.9940905122), (0.7439487758, 43.2501417365), (0, 41.4540905122))
            Line((0, 41.4540905122), (0, 43.9940905122))
            Line((0, 43.9940905122), (2.54, 43.9940905122))
        make_face()
        with BuildLine():
            ThreePointArc((0, 33.0720905122), (0.7439487758, 31.276039288), (2.54, 30.5320905122))
            Line((2.54, 30.5320905122), (0, 30.5320905122))
            Line((0, 30.5320905122), (0, 33.0720905122))
        make_face()
        with BuildLine():
            ThreePointArc((1.524, 30.5320905122), (3.3200512242, 31.276039288), (4.064, 33.0720905122))
            Line((4.064, 33.0720905122), (4.064, 30.5320905122))
            Line((4.064, 30.5320905122), (1.524, 30.5320905122))
        make_face()
    extrude(amount=F3_T3_DEPTH, mode=Mode.SUBTRACT)

    # F4 (on face) → F5 (cut, through all)
    with BuildSketch(Plane.XY.offset(12.7)):
        Polygon((2.1997045256, -3.81), (4.3994090512, 0), (2.1997045256, 3.81), (-2.1997045256, 3.81), (-4.3994090512, 0), (-2.1997045256, -3.81), align=None)
    extrude(amount=-F5_DEPTH, mode=Mode.SUBTRACT)


solid = f1.part
